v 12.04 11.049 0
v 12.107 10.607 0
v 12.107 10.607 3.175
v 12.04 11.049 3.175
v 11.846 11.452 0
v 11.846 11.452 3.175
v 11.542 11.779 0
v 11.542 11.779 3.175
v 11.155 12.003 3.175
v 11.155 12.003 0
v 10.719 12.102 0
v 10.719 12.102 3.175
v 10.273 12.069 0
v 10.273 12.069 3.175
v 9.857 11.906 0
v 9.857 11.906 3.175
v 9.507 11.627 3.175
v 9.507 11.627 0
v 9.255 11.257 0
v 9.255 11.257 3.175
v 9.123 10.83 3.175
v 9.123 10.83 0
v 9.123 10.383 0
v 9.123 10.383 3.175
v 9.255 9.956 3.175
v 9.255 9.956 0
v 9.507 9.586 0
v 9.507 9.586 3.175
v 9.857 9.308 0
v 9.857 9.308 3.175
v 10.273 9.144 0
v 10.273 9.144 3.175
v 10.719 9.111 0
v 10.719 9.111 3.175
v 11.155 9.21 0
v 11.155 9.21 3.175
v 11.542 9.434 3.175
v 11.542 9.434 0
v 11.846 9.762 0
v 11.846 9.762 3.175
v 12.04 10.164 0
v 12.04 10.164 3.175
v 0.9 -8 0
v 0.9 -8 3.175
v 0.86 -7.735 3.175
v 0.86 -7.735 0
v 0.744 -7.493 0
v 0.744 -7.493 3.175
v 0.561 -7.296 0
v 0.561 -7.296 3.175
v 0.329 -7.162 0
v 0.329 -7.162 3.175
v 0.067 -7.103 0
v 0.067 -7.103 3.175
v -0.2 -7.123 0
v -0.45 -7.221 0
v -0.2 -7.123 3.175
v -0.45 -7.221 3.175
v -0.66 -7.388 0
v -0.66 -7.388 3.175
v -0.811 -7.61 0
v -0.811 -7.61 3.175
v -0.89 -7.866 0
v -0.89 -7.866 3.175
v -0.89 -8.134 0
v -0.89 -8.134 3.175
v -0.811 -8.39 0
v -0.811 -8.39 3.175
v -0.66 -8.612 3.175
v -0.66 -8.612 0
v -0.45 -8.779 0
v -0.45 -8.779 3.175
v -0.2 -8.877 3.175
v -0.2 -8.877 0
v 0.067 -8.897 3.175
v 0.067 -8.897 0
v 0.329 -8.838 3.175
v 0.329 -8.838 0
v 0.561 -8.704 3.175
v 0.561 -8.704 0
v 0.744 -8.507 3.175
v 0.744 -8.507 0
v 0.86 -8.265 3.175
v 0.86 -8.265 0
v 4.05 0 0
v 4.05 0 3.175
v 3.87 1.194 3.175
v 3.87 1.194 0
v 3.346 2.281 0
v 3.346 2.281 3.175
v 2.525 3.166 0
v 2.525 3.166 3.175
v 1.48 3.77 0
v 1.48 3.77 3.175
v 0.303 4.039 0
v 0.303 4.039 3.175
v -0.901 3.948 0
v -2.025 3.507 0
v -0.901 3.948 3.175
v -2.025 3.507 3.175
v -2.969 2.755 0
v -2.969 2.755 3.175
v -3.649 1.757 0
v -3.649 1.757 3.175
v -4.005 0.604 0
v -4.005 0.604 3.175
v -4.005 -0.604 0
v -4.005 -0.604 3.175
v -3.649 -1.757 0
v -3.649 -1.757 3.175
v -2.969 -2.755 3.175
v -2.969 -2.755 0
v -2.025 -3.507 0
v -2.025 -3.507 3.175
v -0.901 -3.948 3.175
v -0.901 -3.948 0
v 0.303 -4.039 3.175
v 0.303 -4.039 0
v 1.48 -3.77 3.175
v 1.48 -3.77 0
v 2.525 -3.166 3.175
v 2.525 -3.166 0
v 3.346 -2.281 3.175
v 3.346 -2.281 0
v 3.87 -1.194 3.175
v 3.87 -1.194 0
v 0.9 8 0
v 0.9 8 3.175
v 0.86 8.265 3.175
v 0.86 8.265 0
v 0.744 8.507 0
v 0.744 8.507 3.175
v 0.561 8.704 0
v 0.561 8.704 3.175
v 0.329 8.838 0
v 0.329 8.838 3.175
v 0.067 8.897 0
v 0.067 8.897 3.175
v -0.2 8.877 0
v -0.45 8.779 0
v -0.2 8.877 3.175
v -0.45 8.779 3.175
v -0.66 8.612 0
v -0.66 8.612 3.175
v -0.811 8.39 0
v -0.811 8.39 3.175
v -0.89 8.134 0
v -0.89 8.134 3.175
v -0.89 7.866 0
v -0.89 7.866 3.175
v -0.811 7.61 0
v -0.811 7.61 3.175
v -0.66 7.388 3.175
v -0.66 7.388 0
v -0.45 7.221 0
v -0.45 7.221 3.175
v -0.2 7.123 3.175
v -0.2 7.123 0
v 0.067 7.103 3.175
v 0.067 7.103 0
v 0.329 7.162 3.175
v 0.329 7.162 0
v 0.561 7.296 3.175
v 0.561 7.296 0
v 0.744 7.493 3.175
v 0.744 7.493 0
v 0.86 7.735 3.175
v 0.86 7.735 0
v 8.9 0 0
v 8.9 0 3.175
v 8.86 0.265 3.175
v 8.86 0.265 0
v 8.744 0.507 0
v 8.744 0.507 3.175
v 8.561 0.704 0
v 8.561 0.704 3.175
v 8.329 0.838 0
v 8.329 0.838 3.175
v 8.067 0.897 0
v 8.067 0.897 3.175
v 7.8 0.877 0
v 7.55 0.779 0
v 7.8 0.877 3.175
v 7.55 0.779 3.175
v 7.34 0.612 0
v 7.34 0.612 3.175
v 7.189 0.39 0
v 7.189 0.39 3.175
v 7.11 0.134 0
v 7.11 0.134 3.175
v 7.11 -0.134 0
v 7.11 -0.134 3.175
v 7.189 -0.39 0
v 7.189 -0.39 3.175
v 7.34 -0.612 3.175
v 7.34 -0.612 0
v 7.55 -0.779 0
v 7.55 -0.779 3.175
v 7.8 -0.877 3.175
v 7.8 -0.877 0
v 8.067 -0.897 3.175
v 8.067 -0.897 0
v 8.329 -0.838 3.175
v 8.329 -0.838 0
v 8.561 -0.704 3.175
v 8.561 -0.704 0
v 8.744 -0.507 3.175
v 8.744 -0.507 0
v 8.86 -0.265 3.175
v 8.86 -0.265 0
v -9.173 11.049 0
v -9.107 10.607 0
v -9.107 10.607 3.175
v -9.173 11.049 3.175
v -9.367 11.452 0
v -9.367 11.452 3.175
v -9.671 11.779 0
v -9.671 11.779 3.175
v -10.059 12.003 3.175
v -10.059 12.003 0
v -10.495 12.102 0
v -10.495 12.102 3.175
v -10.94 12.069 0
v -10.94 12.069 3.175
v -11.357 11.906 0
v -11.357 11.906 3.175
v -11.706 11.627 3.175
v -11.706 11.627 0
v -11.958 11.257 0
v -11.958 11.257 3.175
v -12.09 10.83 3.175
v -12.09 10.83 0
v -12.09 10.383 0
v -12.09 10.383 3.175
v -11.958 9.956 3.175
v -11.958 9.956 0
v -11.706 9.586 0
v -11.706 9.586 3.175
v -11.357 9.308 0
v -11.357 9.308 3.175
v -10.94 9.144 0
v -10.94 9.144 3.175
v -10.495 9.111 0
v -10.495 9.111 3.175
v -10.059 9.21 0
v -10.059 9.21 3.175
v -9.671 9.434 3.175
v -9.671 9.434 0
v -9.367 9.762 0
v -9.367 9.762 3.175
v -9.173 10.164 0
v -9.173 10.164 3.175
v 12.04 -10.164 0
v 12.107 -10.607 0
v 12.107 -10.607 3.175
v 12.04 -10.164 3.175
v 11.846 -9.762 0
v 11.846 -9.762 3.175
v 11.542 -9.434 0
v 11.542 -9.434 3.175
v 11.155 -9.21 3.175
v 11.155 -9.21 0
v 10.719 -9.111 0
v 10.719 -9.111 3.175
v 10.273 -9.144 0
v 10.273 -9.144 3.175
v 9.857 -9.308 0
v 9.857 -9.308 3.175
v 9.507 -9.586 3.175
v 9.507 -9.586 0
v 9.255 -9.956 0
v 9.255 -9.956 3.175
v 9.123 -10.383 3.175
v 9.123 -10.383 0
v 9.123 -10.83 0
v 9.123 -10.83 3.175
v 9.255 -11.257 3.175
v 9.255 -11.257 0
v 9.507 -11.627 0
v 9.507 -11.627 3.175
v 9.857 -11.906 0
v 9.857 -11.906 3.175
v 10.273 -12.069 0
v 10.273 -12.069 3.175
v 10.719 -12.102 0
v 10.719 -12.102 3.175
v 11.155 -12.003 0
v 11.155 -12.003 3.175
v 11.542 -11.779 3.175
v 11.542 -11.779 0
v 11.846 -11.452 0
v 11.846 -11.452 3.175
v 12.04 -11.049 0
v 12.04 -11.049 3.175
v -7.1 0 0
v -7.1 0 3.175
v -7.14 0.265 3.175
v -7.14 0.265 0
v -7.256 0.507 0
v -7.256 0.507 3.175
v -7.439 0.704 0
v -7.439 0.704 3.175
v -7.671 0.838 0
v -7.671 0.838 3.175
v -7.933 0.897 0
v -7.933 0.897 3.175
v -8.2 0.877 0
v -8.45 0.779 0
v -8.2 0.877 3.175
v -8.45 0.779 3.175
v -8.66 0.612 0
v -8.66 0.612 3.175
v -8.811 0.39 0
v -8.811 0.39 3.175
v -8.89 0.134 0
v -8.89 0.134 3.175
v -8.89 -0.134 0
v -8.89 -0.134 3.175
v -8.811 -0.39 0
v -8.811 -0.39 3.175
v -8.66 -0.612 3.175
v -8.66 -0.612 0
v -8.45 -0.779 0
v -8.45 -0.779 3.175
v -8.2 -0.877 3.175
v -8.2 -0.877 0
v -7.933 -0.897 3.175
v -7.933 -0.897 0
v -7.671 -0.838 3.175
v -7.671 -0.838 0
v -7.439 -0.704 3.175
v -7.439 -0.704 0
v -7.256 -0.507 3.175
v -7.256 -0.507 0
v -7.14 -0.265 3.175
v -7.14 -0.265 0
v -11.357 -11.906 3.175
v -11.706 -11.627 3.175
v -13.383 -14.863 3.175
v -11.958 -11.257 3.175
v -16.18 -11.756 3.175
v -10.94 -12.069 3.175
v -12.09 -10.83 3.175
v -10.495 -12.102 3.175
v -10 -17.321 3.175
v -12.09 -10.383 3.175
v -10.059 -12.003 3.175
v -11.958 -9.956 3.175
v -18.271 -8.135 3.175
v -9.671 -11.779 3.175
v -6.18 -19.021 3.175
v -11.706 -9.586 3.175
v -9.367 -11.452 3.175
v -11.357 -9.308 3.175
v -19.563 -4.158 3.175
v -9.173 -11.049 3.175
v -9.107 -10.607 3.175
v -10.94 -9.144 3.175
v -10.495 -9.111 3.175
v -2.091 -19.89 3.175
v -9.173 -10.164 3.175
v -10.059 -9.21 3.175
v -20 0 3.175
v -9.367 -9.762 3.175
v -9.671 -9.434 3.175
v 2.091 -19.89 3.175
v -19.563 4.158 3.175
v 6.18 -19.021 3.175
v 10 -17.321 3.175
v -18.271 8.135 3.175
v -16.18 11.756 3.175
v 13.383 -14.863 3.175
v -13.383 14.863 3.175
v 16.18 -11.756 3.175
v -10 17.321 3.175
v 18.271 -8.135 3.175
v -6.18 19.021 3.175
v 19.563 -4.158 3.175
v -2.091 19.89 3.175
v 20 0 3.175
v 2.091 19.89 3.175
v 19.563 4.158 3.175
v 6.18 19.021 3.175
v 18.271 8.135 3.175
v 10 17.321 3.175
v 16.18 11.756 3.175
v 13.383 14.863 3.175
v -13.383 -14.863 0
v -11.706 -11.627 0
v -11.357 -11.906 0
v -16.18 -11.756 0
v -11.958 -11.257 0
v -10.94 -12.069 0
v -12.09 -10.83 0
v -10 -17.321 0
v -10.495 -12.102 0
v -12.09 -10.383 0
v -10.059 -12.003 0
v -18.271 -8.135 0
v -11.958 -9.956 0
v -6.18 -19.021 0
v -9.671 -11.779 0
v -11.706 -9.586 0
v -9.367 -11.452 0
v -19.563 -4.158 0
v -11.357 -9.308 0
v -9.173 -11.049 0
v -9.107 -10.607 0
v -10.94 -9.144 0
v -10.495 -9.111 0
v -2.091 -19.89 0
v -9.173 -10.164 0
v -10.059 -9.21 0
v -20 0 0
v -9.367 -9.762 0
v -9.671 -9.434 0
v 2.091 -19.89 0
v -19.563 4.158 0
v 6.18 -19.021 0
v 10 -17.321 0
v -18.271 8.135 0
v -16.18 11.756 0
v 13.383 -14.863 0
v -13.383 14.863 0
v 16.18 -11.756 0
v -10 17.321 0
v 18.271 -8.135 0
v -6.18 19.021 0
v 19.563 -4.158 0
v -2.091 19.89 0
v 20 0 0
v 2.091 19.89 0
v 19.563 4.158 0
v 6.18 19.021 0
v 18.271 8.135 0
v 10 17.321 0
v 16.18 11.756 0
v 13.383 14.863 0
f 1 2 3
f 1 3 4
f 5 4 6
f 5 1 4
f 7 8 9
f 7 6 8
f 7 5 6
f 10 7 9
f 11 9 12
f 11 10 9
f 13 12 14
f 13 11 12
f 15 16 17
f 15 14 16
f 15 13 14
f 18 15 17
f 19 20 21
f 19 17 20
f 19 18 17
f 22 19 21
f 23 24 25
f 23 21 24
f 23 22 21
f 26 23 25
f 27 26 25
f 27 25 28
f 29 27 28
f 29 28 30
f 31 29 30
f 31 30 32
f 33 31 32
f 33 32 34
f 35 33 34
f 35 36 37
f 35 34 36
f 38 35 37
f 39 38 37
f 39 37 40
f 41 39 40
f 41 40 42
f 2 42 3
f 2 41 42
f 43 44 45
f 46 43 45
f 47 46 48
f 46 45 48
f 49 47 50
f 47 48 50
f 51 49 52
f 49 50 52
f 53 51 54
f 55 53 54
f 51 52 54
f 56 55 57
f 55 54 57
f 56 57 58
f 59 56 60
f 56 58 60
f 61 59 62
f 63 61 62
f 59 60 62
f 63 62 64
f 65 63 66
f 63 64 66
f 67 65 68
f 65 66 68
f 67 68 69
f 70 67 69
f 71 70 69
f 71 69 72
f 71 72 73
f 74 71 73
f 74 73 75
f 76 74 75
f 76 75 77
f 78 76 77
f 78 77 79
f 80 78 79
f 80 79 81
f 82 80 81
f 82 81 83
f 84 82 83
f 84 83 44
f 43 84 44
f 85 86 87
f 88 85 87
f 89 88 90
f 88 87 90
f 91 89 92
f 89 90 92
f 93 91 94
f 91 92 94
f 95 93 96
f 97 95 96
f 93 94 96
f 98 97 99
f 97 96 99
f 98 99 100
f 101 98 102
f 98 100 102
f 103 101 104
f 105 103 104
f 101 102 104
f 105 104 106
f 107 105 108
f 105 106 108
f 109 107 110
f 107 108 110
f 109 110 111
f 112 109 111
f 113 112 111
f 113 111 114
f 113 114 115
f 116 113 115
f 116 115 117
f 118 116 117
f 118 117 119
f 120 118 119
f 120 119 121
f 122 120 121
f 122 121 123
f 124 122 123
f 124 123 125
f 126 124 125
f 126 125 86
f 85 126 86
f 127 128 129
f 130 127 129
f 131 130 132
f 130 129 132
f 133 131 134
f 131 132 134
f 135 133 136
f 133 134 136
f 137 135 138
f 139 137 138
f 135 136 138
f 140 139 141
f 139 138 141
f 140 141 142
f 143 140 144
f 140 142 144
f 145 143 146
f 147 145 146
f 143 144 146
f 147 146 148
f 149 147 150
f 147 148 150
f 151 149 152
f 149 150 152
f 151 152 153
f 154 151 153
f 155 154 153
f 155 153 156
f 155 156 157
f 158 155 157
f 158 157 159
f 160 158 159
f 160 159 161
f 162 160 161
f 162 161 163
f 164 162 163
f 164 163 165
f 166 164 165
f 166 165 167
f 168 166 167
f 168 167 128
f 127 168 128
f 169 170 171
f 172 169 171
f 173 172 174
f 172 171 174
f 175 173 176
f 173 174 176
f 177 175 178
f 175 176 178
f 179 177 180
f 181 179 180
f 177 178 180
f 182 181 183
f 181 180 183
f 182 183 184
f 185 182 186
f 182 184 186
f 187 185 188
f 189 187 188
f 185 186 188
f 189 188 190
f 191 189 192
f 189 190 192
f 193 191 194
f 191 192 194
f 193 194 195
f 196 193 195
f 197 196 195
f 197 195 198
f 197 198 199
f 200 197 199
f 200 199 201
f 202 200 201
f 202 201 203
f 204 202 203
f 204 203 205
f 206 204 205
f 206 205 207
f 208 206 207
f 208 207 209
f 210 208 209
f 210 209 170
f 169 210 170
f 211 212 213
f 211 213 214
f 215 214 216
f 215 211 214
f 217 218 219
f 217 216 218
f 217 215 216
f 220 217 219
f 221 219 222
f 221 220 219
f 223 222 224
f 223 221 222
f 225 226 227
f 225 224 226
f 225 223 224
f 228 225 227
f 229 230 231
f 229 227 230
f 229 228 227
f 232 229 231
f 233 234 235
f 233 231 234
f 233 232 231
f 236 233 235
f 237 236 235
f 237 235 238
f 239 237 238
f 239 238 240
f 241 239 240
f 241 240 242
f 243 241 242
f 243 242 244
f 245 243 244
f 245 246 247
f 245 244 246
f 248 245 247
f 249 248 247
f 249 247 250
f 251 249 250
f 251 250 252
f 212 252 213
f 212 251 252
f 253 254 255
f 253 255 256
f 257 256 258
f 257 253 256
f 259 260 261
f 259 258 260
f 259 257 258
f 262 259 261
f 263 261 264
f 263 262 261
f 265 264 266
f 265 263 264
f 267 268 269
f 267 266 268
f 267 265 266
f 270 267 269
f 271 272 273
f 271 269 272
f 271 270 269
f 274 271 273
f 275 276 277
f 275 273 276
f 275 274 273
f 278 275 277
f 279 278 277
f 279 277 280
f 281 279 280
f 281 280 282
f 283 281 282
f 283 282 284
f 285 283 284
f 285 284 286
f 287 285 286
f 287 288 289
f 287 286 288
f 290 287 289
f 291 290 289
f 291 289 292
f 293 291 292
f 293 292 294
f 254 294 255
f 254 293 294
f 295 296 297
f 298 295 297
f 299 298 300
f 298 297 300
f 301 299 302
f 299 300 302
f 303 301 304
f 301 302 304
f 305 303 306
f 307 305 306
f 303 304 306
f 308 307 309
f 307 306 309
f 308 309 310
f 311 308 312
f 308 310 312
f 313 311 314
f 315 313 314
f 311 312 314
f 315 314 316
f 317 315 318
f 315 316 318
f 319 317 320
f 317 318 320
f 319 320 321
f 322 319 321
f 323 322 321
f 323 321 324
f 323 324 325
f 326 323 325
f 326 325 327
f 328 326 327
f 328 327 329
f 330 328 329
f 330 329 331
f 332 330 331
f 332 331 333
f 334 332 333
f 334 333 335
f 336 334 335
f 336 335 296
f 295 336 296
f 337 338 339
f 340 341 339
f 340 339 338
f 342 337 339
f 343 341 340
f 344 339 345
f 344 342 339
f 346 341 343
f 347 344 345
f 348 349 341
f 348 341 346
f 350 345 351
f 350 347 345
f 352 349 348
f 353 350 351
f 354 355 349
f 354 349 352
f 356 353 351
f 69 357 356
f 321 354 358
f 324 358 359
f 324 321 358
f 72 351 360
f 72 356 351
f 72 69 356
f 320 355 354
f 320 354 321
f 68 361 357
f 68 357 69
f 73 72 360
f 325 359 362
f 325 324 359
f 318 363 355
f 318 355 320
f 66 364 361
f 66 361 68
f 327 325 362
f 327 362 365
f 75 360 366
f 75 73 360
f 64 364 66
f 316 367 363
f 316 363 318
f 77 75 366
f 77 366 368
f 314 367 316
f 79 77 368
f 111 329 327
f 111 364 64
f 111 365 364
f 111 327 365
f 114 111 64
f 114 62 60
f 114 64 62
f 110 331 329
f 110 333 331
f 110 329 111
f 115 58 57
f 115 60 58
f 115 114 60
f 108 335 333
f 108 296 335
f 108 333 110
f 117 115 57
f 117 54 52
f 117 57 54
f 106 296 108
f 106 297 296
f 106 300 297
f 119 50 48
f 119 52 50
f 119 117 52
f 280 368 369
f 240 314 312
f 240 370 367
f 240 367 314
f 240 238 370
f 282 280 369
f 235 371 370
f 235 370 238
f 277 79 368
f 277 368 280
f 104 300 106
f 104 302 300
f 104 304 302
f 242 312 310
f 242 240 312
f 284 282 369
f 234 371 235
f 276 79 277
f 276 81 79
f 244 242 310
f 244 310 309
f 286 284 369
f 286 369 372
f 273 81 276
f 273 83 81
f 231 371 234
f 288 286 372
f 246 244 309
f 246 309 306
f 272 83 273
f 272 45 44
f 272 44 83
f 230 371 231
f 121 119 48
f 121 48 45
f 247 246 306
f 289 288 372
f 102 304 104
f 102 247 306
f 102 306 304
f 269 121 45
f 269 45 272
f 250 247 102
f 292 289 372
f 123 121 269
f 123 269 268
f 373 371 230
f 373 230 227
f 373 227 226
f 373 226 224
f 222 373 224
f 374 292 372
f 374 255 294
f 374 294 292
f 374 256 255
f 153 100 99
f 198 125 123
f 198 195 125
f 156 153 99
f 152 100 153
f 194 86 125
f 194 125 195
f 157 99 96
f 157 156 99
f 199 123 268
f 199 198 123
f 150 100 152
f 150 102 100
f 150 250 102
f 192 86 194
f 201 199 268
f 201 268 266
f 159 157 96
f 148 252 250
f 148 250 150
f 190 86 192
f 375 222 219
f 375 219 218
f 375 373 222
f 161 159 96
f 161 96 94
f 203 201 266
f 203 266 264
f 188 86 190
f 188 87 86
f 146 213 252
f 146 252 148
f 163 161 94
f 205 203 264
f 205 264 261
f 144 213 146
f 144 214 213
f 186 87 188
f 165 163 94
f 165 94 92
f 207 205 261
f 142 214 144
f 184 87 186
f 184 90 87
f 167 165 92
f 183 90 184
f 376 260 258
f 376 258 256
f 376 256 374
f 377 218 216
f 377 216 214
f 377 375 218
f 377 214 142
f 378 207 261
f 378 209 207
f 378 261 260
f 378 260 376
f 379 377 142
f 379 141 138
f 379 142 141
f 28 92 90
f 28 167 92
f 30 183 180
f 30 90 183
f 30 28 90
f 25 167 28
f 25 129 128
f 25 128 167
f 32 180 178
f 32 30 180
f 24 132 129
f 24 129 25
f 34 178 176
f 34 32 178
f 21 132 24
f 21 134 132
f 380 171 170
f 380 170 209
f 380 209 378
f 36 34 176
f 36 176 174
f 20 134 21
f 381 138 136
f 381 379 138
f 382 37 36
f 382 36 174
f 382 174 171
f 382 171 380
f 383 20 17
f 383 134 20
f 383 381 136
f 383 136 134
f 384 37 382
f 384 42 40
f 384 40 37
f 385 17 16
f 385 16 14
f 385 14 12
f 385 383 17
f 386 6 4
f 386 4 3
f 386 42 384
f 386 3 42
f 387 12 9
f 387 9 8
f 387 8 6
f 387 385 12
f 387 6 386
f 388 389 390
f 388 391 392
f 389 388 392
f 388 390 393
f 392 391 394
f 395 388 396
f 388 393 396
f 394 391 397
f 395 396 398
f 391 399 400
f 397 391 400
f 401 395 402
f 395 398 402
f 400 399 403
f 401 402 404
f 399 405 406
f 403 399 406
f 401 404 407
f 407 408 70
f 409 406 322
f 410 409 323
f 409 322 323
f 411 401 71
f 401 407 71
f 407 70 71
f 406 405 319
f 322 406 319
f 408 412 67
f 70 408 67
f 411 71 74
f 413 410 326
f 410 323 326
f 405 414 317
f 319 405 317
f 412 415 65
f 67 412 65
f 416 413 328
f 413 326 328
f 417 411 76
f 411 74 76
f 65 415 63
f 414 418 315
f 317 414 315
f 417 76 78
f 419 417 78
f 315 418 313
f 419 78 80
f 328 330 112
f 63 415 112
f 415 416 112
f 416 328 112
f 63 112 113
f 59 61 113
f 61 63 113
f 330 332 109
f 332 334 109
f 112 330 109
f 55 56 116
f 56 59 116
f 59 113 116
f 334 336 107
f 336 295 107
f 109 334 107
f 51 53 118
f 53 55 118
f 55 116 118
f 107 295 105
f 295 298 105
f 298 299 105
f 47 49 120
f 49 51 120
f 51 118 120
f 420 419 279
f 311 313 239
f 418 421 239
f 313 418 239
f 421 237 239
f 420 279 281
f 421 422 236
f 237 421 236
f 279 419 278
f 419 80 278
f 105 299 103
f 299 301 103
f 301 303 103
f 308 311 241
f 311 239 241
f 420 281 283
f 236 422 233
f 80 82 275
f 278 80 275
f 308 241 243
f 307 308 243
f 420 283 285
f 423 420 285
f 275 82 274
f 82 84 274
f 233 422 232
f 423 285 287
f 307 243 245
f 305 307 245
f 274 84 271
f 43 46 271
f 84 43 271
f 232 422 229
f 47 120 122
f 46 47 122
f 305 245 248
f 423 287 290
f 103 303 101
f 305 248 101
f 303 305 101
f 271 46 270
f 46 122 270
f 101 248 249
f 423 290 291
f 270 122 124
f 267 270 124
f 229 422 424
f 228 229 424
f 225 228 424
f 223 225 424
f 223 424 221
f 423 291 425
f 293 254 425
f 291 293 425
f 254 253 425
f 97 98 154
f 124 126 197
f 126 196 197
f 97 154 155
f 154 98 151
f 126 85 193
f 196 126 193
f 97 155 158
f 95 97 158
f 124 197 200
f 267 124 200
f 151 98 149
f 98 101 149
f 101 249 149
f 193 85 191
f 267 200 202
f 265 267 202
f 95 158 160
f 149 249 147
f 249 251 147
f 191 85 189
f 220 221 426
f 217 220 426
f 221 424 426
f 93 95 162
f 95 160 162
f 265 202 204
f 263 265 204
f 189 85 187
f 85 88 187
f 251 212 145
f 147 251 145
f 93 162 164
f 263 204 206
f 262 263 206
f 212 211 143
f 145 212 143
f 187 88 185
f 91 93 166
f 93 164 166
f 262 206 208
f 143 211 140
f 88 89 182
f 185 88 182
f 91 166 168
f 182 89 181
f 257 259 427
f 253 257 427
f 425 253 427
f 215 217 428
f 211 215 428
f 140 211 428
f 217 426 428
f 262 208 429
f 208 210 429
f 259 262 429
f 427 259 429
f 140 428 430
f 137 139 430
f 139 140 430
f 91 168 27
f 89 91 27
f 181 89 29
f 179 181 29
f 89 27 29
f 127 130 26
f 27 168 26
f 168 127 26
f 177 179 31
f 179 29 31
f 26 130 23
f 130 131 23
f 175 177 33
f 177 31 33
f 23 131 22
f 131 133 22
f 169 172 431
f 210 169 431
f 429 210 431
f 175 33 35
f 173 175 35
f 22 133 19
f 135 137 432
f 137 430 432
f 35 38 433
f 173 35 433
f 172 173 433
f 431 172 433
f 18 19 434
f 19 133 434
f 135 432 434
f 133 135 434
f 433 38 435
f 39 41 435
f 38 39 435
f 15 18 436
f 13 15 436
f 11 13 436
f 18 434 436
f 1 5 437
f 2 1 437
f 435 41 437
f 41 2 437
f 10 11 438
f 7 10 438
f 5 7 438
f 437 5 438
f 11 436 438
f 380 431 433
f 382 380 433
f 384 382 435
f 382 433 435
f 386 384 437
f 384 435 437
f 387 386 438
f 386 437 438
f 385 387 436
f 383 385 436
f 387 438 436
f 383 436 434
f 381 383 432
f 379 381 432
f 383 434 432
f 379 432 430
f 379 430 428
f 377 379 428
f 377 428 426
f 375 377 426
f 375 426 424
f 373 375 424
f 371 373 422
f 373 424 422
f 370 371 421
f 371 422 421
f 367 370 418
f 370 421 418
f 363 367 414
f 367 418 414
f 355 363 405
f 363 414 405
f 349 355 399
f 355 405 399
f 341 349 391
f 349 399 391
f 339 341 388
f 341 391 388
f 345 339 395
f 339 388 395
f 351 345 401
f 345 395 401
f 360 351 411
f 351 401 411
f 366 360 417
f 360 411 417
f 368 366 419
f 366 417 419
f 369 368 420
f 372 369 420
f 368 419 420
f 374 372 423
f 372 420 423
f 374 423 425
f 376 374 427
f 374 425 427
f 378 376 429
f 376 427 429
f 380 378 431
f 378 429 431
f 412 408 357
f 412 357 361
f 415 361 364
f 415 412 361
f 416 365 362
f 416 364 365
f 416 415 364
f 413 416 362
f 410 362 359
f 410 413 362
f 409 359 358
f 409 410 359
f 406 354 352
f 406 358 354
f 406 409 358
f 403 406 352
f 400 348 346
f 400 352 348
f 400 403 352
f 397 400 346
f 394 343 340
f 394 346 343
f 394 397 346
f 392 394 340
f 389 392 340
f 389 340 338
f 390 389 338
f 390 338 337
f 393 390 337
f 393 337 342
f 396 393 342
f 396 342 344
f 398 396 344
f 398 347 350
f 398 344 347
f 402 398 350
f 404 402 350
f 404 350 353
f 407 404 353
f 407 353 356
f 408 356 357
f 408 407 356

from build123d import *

# Parameters (mm, degrees)
ESQUISSE1_R                  = 20
BOSS_EXTRU_1_DEPTH           = 3.175
ESQUISSE2_R                  = 4.05
ESQUISSE2_R_2                = 0.9
ENL_V_MAT_EXTRU_1_DEPTH      = 29.461915343
ENL_V_MAT_EXTRU_2_DEPTH      = 29.461915343
ENL_V_MAT_EXTRU_2_DEPTH_BACK = 29.461915343
ESQUISSE3_R                  = 1.5


with BuildPart() as part:
    # Esquisse1 → Boss.-Extru.1 (new body)
    with BuildSketch(Plane.XY):
        Circle(ESQUISSE1_R)
    extrude(amount=BOSS_EXTRU_1_DEPTH)

    # Esquisse2 → Enlèv. mat.-Extru.1 (cut, through all)
    with BuildSketch(Plane.XY.offset(3.175)):
        Circle(ESQUISSE2_R)
        with Locations((0, 8)):
            Circle(ESQUISSE2_R_2)
        with Locations((8, 0)):
            Circle(ESQUISSE2_R_2)
        with Locations((0, -8)):
            Circle(ESQUISSE2_R_2)
        with Locations((-8, 0)):
            Circle(ESQUISSE2_R_2)
    extrude(amount=-ENL_V_MAT_EXTRU_1_DEPTH, mode=Mode.SUBTRACT)

    # Esquisse3 → Enlèv. mat.-Extru.2 (cut, two sides: drawn at the far end of the back side and taken through both)
    with BuildSketch(Plane.XY.offset(3.175).offset(-ENL_V_MAT_EXTRU_2_DEPTH_BACK)):
        with Locations((10.606601718, 10.606601718)):
            Circle(ESQUISSE3_R)
        with Locations((10.606601718, -10.606601718)):
            Circle(ESQUISSE3_R)
        with Locations((-10.606601718, -10.606601718)):
            Circle(ESQUISSE3_R)
        with Locations((-10.606601718, 10.606601718)):
            Circle(ESQUISSE3_R)
    extrude(amount=ENL_V_MAT_EXTRU_2_DEPTH + ENL_V_MAT_EXTRU_2_DEPTH_BACK, mode=Mode.SUBTRACT)


solid = part.part
